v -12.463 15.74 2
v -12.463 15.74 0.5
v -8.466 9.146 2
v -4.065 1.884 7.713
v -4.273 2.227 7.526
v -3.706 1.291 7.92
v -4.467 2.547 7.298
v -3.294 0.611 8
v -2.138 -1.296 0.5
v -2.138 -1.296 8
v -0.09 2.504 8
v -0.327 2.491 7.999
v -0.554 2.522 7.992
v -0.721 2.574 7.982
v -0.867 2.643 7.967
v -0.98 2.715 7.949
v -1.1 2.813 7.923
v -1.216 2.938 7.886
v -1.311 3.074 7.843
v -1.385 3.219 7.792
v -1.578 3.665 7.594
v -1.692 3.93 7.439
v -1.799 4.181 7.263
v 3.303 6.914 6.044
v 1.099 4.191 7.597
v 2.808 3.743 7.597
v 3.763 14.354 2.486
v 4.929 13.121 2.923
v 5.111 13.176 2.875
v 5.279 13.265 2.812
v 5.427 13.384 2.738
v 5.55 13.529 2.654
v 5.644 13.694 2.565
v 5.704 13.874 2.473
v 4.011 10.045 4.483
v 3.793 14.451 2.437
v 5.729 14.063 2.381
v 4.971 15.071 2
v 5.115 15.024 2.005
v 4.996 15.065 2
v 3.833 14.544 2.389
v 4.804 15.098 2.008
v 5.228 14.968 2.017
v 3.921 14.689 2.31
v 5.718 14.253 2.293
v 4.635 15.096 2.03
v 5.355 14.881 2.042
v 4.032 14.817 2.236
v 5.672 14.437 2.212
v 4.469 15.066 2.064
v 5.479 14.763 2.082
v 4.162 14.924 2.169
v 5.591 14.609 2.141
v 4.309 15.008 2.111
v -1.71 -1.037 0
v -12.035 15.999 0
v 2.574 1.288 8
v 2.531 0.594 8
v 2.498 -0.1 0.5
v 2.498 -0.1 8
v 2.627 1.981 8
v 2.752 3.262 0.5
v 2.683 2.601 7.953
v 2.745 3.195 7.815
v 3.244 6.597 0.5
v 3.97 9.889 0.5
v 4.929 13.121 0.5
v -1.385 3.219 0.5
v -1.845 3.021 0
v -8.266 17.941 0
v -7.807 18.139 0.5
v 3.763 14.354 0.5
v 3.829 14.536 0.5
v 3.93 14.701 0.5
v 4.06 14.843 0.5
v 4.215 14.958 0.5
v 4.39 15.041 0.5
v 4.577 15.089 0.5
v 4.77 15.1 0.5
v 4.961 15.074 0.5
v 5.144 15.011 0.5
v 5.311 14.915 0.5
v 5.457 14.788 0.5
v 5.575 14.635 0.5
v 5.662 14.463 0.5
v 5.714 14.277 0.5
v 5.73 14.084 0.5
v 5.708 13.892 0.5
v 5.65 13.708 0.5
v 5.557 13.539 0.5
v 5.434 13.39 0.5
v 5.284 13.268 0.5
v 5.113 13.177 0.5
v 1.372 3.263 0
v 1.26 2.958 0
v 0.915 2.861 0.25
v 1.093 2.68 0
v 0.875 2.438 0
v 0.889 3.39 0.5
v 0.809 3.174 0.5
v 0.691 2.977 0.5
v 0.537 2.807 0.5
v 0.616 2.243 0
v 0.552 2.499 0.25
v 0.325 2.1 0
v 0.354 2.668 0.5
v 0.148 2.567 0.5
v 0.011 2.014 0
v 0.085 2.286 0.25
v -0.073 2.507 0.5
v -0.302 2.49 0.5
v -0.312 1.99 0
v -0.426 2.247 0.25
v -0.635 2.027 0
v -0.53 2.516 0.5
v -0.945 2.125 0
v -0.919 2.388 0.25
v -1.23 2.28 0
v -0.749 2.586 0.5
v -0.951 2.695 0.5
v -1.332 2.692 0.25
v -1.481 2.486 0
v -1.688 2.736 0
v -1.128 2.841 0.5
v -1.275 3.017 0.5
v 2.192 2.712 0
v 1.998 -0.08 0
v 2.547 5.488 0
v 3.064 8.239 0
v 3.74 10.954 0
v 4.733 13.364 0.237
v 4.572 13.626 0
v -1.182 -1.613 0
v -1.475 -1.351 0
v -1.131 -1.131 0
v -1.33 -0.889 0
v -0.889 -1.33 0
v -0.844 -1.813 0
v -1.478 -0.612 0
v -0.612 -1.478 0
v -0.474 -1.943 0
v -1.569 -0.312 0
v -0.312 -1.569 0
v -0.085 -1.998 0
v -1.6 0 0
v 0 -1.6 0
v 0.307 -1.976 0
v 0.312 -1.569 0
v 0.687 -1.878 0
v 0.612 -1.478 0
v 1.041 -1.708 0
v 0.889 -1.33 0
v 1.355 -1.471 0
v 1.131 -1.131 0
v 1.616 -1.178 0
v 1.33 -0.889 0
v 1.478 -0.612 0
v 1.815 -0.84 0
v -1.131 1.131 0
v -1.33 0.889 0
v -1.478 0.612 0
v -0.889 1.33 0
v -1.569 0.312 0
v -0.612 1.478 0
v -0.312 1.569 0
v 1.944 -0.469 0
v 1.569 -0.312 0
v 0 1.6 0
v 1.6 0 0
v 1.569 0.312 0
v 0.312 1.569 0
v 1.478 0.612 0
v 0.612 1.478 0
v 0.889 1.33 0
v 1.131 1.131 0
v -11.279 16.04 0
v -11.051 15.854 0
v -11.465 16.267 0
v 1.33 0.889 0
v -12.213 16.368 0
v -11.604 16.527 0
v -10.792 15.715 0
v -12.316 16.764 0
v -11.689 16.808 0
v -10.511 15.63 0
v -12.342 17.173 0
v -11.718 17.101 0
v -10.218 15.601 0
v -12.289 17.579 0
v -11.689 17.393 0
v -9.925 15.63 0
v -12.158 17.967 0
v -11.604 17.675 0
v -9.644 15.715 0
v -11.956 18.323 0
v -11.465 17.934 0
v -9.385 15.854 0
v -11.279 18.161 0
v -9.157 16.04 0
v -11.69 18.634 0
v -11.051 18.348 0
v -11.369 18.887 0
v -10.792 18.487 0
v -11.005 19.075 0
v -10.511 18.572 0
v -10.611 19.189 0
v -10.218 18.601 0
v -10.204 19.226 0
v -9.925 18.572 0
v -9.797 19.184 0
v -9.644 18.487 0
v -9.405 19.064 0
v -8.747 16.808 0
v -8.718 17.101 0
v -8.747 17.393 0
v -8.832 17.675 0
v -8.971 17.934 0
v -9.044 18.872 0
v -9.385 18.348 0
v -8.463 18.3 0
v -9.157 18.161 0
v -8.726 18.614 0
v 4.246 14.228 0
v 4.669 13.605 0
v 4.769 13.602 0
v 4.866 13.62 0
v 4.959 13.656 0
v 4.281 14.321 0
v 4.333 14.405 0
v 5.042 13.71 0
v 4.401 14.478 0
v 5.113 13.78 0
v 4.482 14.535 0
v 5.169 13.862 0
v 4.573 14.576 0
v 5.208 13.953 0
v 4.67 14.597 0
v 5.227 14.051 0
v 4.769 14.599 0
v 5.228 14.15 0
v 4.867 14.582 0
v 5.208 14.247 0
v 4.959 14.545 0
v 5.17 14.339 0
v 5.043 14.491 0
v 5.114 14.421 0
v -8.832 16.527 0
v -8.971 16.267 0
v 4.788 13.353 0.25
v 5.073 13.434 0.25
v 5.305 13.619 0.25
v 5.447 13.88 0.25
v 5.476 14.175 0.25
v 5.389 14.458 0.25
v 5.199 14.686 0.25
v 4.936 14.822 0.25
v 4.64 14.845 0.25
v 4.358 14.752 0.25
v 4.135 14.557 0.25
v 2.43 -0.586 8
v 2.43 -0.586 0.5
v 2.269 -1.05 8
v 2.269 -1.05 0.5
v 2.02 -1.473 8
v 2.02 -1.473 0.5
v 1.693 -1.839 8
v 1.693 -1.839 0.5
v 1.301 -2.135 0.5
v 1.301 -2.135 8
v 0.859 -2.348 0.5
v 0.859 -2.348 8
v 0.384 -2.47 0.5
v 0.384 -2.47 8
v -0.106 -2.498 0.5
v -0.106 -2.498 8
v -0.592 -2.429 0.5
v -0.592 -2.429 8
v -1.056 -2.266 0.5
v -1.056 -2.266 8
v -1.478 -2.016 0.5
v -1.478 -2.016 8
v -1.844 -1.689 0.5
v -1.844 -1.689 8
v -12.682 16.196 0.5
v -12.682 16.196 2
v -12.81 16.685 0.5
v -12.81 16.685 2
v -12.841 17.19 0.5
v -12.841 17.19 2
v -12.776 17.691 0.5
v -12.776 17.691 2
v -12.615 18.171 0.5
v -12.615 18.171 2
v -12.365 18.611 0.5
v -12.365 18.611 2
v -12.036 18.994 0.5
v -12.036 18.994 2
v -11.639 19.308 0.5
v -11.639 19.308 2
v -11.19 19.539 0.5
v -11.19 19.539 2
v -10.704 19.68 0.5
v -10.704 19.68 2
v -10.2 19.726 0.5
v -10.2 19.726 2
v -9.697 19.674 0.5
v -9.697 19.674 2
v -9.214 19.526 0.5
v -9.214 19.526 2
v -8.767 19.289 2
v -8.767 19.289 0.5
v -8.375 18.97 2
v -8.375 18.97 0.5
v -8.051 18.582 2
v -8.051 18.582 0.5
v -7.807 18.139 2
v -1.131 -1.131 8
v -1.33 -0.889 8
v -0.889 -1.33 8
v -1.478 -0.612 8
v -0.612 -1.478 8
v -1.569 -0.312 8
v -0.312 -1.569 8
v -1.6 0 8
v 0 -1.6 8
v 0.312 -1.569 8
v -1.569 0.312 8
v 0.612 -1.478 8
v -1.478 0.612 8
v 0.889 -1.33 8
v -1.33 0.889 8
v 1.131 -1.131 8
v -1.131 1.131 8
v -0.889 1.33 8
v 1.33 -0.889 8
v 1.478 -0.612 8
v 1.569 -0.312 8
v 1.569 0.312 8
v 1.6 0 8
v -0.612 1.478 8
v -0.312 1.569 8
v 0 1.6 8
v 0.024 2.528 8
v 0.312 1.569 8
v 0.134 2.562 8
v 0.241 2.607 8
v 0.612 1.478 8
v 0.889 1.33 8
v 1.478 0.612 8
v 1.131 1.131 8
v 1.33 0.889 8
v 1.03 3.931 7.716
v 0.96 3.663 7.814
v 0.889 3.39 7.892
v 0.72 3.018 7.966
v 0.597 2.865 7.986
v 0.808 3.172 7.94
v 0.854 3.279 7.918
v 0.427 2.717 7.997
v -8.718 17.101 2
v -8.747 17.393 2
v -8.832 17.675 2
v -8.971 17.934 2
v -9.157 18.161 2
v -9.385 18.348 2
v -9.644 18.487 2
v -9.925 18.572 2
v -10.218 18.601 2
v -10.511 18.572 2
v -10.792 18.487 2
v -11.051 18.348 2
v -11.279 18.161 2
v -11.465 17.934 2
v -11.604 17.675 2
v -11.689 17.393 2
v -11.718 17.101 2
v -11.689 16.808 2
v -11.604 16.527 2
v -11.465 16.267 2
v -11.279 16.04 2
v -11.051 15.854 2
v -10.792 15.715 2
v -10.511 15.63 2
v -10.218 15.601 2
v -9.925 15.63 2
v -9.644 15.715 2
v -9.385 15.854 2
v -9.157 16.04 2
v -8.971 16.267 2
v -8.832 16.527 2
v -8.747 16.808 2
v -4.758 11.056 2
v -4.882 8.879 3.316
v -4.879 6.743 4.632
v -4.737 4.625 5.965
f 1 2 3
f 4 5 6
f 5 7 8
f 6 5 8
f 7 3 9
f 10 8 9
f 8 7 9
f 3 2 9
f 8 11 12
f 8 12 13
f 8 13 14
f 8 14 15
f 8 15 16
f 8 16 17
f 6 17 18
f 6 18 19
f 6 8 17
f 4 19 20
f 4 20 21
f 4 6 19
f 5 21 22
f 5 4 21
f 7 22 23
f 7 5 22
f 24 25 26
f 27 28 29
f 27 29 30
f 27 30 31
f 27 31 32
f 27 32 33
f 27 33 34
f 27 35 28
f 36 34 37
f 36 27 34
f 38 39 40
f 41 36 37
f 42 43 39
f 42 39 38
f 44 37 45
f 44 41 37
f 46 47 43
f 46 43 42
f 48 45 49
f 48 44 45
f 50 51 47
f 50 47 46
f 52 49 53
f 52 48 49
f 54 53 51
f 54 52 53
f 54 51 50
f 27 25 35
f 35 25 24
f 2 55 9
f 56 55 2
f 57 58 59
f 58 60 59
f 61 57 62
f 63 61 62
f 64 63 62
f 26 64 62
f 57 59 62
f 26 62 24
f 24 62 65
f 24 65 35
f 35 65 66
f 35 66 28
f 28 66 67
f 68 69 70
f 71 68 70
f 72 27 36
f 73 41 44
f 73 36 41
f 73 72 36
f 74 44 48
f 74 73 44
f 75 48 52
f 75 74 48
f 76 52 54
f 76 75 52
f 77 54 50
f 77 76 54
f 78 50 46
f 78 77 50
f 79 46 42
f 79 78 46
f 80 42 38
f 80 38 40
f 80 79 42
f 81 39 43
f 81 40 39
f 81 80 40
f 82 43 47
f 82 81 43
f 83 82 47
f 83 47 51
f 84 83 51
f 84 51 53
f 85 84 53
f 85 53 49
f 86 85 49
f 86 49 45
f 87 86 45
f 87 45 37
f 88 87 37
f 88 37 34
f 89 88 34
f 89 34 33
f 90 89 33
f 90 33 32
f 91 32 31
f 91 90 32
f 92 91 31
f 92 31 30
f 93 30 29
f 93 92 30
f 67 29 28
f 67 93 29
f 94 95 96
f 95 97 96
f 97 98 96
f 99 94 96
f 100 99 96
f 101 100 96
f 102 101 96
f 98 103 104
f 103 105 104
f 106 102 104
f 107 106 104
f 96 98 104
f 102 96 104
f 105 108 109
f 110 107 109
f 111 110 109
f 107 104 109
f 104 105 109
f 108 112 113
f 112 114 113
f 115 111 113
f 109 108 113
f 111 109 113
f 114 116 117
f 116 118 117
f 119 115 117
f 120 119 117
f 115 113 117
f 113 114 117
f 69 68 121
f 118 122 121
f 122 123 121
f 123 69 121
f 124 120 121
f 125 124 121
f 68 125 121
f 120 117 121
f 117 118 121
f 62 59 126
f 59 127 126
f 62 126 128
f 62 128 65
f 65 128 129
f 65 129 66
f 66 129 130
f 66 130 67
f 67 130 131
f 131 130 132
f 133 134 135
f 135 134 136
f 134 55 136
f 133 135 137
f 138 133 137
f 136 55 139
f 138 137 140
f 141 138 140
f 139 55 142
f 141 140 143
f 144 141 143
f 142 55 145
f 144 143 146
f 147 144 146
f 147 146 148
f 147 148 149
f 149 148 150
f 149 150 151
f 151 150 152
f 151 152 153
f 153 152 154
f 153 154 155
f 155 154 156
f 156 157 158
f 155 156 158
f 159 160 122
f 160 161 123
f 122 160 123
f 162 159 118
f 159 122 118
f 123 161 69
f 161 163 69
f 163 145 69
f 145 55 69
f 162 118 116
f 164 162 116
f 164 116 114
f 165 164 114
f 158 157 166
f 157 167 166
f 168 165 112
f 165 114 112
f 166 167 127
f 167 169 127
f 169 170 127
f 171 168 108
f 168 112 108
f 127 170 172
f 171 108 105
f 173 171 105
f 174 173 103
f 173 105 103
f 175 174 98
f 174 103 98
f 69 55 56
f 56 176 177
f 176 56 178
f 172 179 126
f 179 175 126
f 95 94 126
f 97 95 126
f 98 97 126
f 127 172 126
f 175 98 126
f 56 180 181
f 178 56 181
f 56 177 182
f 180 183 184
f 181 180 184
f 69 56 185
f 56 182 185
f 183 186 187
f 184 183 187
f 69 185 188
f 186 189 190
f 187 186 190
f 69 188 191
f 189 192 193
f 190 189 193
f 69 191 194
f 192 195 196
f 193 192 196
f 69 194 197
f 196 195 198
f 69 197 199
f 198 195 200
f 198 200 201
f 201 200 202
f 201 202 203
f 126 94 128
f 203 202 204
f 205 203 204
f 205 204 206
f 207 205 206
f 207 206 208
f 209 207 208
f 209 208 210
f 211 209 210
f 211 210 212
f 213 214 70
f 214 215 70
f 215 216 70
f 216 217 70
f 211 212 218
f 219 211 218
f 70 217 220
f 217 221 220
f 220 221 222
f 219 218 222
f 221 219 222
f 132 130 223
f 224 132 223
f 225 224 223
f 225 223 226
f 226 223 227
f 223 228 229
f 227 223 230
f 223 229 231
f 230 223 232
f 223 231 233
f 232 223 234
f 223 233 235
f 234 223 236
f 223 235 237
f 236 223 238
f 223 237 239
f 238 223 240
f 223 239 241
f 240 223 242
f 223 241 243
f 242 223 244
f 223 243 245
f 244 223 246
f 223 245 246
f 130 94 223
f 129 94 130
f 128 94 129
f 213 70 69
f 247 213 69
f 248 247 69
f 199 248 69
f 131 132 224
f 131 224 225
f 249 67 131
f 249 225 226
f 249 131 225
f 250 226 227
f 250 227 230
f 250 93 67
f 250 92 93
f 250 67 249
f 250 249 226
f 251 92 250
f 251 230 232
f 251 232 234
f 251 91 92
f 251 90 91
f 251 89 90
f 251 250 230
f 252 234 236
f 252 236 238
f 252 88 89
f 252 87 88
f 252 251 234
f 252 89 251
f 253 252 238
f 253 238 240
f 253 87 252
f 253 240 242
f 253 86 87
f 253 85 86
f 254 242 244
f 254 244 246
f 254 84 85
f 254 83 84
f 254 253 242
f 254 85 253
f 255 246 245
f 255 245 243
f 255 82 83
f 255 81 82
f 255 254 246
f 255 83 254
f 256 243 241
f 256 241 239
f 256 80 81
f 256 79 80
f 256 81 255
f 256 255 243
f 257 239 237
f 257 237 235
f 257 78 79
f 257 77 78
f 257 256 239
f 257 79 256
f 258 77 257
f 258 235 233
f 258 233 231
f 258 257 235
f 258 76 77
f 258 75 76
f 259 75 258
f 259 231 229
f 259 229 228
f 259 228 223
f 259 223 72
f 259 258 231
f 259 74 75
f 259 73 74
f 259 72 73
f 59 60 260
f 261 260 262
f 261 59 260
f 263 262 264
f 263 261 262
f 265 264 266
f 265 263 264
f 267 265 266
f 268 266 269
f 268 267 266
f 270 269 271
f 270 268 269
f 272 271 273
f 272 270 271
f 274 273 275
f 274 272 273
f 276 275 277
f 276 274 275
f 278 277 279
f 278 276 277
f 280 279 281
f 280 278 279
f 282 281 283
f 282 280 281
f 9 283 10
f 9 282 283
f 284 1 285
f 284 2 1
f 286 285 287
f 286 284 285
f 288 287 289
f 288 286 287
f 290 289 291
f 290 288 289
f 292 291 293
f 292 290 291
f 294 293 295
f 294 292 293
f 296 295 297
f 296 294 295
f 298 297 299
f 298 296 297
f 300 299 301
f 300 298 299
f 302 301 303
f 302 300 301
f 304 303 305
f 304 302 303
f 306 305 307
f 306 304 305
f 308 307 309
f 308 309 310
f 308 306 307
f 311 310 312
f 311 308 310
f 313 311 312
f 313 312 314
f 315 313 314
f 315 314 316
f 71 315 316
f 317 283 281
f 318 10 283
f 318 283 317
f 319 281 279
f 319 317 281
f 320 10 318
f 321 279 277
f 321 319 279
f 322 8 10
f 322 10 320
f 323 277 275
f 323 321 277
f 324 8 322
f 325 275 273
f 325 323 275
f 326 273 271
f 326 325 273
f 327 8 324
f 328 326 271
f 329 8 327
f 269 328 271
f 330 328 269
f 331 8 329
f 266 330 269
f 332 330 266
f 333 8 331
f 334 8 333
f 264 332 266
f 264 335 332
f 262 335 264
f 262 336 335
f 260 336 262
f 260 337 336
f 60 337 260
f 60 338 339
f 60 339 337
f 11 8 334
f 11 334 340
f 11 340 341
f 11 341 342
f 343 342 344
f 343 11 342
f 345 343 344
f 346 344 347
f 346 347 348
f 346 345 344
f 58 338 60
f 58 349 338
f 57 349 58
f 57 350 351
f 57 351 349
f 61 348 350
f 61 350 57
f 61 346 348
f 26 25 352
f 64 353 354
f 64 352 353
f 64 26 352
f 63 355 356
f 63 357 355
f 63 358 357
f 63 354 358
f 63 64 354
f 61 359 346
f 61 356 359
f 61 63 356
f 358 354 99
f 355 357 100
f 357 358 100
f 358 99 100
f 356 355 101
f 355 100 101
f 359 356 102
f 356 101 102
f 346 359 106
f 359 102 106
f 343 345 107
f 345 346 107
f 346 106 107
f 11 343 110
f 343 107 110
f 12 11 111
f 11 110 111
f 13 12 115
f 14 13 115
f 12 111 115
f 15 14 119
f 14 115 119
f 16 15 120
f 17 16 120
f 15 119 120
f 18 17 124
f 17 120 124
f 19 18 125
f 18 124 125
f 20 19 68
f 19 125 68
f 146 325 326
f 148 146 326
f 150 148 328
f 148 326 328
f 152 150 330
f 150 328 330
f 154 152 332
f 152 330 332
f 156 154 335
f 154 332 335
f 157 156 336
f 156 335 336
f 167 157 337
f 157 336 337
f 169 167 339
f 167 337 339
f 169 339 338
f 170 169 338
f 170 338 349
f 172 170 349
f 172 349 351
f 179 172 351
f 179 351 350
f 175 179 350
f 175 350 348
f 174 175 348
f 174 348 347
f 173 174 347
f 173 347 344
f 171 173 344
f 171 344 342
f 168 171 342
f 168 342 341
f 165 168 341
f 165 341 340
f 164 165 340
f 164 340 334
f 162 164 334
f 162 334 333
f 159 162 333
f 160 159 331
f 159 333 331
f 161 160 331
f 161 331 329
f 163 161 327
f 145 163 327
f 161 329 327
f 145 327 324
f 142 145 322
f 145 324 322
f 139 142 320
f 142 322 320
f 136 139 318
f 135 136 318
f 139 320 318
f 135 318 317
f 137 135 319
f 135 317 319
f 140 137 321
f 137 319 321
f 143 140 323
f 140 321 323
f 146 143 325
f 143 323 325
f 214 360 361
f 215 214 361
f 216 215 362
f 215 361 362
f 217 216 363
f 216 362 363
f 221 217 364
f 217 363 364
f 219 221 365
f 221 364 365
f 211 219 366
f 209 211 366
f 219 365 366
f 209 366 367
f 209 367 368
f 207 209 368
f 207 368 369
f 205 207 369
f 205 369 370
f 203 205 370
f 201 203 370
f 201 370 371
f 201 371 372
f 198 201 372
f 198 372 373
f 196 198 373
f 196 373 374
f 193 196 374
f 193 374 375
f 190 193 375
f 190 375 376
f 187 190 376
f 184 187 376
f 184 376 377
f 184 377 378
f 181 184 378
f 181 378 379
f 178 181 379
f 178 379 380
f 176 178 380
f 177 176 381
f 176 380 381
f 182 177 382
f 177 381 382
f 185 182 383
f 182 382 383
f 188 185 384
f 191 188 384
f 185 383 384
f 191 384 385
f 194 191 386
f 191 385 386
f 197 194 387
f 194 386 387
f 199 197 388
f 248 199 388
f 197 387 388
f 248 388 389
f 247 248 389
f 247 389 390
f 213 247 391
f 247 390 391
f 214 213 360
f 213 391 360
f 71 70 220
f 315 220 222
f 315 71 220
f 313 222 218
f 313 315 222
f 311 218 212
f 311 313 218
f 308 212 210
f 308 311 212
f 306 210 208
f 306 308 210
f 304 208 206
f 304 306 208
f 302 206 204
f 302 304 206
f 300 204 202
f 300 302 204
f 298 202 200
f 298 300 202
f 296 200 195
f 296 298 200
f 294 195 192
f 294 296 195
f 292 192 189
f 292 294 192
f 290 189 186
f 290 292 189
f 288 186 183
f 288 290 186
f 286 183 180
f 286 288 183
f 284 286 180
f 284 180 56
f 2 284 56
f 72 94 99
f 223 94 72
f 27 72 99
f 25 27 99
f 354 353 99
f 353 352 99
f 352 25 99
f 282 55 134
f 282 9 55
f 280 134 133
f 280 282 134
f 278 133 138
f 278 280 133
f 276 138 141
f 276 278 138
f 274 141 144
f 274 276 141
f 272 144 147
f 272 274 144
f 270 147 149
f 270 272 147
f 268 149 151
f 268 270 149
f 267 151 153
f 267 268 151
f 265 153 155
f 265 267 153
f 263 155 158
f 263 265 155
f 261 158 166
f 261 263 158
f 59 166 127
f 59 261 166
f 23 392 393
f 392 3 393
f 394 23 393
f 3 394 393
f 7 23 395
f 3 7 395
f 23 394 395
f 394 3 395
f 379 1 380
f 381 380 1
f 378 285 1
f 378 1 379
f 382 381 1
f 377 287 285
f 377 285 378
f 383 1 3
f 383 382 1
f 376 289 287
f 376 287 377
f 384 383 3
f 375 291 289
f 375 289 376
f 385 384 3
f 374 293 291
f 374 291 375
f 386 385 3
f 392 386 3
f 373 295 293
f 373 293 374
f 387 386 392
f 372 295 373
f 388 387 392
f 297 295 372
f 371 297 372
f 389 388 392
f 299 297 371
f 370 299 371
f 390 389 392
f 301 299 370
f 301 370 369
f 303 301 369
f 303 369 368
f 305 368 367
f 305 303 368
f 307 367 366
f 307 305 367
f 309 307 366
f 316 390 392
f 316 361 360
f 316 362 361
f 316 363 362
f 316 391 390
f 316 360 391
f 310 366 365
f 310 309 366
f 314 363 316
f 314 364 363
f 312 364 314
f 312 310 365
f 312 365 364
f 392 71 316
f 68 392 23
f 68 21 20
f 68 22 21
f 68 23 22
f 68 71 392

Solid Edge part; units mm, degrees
sketch "Sketch1" plane through (0, 0, 0) normal (0, 0, 1) x (1, 0, 0)
  line L0 (-12.4629, 15.7402) -> (-2.138, -1.2958)
  arc A0 (-2.138, -1.2958) -> (2.498, -0.1) centre (0, 0) ccw
  arc A1 (4.9286, 13.1207) -> (2.498, -0.1) centre (50.0083, -2.001) ccw
  line L1 (3.7627, 14.3543) -> (0.8885, 3.3896)
  arc A2 (-1.3853, 3.2186) -> (0.8885, 3.3896) centre (-0.2778, 3.6953) ccw
  line L2 (-7.8069, 18.1385) -> (-1.3853, 3.2186)
  arc A3 (3.7627, 14.3543) -> (4.9286, 13.1207) centre (4.73, 14.1008) cw
  arc A4 (-12.4629, 15.7402) -> (-7.8068, 18.1385) centre (-10.218, 17.1008) cw
extrude "Protrusion1" add sketch "Sketch1" along normal blind 8
hole "Agujero_1" at (0, 0, 8) direction (0, 0, -1) diameter 3.2 end up to next
sketch "Sketch2" plane through (-3.5565, 8.6129, 8) normal (0, 0, 1) x (-0.2535623, -0.9673191, 0)
  line L0 (0.7294, -4.8844) -> (-2.0582, -1.782)
  line L1 (-8.1366, -6.5268) -> (-2.0582, -1.782)
  arc A0 (-4.6361, -10.4226) -> (-8.1366, -6.5268) centre (-6.5214, -8.596) cw
  line L2 (-4.6361, -10.4226) -> (0.7294, -4.8844)
extrude "VaciadoExtruido_3" cut sketch "Sketch2" against normal blind 6
chamfer "Chaflán_5" distance 0.5 angle 45 8 edges at (-7.3004, 7.2222, 0) (0.6244, -2.4208, 0) (3.2438, 6.5967, 0) (-11.4201, 19.4344, 0) (-4.5961, 10.6786, 0) (-0.1874, 2.493, 0) (2.3256, 8.8719, 0) (5.4568, 14.7876, 0)
sketch "Sketch3" plane through (0, 0, 4) normal (0, 0, 1) x (1, 0, 0)
  circle A0 centre (-10.218, 17.1008) radius 1.5
extrude "Cutout1" cut sketch "Sketch3" against normal through all
sketch "Sketch4" plane through (2.3256, 8.8719, 4.75) normal (-0.9673191, 0.2535623, 0) x (-0.2535623, -0.9673191, 0)
  line L0 (5.6676, 3.25) -> (-6.6676, -2.75)
extrude "Cutout2" cut sketch "Sketch4" against normal through all material side at (2.4579, 9.3767, 5.045)
sketch "Sketch5" plane through (-4.5961, 10.6786, 4.25) normal (0.9185349, 0.3953399, 0) x (-0.3953399, 0.9185349, 0)
  line L0 (0.4106, 3.75) -> (0.4106, -2.25)
  line L1 (-8.1216, 3.75) -> (0.4106, -2.25)
  line L2 (-8.1216, 3.75) -> (0.4106, 3.75)
sketch "Sketch6" plane through (-7.3004, 7.2222, 4.25) normal (-0.8551957, -0.5183052, 0) x (0.5183052, -0.8551957, 0)
  line L0 (6.4897, 3.75) -> (-2.2493, 3.75)
  line L1 (-2.2493, 3.75) -> (-2.2493, -2.25)
  line L2 (-2.2493, -2.25) -> (6.4897, 3.75)
loft "LoftedCutout1" cut profiles "Sketch5", "Sketch6"
fillet "Redondeo_6" radius 4 2 edges at (-2.6611, 2.4454, 8) (1.8014, 3.1503, 8)
